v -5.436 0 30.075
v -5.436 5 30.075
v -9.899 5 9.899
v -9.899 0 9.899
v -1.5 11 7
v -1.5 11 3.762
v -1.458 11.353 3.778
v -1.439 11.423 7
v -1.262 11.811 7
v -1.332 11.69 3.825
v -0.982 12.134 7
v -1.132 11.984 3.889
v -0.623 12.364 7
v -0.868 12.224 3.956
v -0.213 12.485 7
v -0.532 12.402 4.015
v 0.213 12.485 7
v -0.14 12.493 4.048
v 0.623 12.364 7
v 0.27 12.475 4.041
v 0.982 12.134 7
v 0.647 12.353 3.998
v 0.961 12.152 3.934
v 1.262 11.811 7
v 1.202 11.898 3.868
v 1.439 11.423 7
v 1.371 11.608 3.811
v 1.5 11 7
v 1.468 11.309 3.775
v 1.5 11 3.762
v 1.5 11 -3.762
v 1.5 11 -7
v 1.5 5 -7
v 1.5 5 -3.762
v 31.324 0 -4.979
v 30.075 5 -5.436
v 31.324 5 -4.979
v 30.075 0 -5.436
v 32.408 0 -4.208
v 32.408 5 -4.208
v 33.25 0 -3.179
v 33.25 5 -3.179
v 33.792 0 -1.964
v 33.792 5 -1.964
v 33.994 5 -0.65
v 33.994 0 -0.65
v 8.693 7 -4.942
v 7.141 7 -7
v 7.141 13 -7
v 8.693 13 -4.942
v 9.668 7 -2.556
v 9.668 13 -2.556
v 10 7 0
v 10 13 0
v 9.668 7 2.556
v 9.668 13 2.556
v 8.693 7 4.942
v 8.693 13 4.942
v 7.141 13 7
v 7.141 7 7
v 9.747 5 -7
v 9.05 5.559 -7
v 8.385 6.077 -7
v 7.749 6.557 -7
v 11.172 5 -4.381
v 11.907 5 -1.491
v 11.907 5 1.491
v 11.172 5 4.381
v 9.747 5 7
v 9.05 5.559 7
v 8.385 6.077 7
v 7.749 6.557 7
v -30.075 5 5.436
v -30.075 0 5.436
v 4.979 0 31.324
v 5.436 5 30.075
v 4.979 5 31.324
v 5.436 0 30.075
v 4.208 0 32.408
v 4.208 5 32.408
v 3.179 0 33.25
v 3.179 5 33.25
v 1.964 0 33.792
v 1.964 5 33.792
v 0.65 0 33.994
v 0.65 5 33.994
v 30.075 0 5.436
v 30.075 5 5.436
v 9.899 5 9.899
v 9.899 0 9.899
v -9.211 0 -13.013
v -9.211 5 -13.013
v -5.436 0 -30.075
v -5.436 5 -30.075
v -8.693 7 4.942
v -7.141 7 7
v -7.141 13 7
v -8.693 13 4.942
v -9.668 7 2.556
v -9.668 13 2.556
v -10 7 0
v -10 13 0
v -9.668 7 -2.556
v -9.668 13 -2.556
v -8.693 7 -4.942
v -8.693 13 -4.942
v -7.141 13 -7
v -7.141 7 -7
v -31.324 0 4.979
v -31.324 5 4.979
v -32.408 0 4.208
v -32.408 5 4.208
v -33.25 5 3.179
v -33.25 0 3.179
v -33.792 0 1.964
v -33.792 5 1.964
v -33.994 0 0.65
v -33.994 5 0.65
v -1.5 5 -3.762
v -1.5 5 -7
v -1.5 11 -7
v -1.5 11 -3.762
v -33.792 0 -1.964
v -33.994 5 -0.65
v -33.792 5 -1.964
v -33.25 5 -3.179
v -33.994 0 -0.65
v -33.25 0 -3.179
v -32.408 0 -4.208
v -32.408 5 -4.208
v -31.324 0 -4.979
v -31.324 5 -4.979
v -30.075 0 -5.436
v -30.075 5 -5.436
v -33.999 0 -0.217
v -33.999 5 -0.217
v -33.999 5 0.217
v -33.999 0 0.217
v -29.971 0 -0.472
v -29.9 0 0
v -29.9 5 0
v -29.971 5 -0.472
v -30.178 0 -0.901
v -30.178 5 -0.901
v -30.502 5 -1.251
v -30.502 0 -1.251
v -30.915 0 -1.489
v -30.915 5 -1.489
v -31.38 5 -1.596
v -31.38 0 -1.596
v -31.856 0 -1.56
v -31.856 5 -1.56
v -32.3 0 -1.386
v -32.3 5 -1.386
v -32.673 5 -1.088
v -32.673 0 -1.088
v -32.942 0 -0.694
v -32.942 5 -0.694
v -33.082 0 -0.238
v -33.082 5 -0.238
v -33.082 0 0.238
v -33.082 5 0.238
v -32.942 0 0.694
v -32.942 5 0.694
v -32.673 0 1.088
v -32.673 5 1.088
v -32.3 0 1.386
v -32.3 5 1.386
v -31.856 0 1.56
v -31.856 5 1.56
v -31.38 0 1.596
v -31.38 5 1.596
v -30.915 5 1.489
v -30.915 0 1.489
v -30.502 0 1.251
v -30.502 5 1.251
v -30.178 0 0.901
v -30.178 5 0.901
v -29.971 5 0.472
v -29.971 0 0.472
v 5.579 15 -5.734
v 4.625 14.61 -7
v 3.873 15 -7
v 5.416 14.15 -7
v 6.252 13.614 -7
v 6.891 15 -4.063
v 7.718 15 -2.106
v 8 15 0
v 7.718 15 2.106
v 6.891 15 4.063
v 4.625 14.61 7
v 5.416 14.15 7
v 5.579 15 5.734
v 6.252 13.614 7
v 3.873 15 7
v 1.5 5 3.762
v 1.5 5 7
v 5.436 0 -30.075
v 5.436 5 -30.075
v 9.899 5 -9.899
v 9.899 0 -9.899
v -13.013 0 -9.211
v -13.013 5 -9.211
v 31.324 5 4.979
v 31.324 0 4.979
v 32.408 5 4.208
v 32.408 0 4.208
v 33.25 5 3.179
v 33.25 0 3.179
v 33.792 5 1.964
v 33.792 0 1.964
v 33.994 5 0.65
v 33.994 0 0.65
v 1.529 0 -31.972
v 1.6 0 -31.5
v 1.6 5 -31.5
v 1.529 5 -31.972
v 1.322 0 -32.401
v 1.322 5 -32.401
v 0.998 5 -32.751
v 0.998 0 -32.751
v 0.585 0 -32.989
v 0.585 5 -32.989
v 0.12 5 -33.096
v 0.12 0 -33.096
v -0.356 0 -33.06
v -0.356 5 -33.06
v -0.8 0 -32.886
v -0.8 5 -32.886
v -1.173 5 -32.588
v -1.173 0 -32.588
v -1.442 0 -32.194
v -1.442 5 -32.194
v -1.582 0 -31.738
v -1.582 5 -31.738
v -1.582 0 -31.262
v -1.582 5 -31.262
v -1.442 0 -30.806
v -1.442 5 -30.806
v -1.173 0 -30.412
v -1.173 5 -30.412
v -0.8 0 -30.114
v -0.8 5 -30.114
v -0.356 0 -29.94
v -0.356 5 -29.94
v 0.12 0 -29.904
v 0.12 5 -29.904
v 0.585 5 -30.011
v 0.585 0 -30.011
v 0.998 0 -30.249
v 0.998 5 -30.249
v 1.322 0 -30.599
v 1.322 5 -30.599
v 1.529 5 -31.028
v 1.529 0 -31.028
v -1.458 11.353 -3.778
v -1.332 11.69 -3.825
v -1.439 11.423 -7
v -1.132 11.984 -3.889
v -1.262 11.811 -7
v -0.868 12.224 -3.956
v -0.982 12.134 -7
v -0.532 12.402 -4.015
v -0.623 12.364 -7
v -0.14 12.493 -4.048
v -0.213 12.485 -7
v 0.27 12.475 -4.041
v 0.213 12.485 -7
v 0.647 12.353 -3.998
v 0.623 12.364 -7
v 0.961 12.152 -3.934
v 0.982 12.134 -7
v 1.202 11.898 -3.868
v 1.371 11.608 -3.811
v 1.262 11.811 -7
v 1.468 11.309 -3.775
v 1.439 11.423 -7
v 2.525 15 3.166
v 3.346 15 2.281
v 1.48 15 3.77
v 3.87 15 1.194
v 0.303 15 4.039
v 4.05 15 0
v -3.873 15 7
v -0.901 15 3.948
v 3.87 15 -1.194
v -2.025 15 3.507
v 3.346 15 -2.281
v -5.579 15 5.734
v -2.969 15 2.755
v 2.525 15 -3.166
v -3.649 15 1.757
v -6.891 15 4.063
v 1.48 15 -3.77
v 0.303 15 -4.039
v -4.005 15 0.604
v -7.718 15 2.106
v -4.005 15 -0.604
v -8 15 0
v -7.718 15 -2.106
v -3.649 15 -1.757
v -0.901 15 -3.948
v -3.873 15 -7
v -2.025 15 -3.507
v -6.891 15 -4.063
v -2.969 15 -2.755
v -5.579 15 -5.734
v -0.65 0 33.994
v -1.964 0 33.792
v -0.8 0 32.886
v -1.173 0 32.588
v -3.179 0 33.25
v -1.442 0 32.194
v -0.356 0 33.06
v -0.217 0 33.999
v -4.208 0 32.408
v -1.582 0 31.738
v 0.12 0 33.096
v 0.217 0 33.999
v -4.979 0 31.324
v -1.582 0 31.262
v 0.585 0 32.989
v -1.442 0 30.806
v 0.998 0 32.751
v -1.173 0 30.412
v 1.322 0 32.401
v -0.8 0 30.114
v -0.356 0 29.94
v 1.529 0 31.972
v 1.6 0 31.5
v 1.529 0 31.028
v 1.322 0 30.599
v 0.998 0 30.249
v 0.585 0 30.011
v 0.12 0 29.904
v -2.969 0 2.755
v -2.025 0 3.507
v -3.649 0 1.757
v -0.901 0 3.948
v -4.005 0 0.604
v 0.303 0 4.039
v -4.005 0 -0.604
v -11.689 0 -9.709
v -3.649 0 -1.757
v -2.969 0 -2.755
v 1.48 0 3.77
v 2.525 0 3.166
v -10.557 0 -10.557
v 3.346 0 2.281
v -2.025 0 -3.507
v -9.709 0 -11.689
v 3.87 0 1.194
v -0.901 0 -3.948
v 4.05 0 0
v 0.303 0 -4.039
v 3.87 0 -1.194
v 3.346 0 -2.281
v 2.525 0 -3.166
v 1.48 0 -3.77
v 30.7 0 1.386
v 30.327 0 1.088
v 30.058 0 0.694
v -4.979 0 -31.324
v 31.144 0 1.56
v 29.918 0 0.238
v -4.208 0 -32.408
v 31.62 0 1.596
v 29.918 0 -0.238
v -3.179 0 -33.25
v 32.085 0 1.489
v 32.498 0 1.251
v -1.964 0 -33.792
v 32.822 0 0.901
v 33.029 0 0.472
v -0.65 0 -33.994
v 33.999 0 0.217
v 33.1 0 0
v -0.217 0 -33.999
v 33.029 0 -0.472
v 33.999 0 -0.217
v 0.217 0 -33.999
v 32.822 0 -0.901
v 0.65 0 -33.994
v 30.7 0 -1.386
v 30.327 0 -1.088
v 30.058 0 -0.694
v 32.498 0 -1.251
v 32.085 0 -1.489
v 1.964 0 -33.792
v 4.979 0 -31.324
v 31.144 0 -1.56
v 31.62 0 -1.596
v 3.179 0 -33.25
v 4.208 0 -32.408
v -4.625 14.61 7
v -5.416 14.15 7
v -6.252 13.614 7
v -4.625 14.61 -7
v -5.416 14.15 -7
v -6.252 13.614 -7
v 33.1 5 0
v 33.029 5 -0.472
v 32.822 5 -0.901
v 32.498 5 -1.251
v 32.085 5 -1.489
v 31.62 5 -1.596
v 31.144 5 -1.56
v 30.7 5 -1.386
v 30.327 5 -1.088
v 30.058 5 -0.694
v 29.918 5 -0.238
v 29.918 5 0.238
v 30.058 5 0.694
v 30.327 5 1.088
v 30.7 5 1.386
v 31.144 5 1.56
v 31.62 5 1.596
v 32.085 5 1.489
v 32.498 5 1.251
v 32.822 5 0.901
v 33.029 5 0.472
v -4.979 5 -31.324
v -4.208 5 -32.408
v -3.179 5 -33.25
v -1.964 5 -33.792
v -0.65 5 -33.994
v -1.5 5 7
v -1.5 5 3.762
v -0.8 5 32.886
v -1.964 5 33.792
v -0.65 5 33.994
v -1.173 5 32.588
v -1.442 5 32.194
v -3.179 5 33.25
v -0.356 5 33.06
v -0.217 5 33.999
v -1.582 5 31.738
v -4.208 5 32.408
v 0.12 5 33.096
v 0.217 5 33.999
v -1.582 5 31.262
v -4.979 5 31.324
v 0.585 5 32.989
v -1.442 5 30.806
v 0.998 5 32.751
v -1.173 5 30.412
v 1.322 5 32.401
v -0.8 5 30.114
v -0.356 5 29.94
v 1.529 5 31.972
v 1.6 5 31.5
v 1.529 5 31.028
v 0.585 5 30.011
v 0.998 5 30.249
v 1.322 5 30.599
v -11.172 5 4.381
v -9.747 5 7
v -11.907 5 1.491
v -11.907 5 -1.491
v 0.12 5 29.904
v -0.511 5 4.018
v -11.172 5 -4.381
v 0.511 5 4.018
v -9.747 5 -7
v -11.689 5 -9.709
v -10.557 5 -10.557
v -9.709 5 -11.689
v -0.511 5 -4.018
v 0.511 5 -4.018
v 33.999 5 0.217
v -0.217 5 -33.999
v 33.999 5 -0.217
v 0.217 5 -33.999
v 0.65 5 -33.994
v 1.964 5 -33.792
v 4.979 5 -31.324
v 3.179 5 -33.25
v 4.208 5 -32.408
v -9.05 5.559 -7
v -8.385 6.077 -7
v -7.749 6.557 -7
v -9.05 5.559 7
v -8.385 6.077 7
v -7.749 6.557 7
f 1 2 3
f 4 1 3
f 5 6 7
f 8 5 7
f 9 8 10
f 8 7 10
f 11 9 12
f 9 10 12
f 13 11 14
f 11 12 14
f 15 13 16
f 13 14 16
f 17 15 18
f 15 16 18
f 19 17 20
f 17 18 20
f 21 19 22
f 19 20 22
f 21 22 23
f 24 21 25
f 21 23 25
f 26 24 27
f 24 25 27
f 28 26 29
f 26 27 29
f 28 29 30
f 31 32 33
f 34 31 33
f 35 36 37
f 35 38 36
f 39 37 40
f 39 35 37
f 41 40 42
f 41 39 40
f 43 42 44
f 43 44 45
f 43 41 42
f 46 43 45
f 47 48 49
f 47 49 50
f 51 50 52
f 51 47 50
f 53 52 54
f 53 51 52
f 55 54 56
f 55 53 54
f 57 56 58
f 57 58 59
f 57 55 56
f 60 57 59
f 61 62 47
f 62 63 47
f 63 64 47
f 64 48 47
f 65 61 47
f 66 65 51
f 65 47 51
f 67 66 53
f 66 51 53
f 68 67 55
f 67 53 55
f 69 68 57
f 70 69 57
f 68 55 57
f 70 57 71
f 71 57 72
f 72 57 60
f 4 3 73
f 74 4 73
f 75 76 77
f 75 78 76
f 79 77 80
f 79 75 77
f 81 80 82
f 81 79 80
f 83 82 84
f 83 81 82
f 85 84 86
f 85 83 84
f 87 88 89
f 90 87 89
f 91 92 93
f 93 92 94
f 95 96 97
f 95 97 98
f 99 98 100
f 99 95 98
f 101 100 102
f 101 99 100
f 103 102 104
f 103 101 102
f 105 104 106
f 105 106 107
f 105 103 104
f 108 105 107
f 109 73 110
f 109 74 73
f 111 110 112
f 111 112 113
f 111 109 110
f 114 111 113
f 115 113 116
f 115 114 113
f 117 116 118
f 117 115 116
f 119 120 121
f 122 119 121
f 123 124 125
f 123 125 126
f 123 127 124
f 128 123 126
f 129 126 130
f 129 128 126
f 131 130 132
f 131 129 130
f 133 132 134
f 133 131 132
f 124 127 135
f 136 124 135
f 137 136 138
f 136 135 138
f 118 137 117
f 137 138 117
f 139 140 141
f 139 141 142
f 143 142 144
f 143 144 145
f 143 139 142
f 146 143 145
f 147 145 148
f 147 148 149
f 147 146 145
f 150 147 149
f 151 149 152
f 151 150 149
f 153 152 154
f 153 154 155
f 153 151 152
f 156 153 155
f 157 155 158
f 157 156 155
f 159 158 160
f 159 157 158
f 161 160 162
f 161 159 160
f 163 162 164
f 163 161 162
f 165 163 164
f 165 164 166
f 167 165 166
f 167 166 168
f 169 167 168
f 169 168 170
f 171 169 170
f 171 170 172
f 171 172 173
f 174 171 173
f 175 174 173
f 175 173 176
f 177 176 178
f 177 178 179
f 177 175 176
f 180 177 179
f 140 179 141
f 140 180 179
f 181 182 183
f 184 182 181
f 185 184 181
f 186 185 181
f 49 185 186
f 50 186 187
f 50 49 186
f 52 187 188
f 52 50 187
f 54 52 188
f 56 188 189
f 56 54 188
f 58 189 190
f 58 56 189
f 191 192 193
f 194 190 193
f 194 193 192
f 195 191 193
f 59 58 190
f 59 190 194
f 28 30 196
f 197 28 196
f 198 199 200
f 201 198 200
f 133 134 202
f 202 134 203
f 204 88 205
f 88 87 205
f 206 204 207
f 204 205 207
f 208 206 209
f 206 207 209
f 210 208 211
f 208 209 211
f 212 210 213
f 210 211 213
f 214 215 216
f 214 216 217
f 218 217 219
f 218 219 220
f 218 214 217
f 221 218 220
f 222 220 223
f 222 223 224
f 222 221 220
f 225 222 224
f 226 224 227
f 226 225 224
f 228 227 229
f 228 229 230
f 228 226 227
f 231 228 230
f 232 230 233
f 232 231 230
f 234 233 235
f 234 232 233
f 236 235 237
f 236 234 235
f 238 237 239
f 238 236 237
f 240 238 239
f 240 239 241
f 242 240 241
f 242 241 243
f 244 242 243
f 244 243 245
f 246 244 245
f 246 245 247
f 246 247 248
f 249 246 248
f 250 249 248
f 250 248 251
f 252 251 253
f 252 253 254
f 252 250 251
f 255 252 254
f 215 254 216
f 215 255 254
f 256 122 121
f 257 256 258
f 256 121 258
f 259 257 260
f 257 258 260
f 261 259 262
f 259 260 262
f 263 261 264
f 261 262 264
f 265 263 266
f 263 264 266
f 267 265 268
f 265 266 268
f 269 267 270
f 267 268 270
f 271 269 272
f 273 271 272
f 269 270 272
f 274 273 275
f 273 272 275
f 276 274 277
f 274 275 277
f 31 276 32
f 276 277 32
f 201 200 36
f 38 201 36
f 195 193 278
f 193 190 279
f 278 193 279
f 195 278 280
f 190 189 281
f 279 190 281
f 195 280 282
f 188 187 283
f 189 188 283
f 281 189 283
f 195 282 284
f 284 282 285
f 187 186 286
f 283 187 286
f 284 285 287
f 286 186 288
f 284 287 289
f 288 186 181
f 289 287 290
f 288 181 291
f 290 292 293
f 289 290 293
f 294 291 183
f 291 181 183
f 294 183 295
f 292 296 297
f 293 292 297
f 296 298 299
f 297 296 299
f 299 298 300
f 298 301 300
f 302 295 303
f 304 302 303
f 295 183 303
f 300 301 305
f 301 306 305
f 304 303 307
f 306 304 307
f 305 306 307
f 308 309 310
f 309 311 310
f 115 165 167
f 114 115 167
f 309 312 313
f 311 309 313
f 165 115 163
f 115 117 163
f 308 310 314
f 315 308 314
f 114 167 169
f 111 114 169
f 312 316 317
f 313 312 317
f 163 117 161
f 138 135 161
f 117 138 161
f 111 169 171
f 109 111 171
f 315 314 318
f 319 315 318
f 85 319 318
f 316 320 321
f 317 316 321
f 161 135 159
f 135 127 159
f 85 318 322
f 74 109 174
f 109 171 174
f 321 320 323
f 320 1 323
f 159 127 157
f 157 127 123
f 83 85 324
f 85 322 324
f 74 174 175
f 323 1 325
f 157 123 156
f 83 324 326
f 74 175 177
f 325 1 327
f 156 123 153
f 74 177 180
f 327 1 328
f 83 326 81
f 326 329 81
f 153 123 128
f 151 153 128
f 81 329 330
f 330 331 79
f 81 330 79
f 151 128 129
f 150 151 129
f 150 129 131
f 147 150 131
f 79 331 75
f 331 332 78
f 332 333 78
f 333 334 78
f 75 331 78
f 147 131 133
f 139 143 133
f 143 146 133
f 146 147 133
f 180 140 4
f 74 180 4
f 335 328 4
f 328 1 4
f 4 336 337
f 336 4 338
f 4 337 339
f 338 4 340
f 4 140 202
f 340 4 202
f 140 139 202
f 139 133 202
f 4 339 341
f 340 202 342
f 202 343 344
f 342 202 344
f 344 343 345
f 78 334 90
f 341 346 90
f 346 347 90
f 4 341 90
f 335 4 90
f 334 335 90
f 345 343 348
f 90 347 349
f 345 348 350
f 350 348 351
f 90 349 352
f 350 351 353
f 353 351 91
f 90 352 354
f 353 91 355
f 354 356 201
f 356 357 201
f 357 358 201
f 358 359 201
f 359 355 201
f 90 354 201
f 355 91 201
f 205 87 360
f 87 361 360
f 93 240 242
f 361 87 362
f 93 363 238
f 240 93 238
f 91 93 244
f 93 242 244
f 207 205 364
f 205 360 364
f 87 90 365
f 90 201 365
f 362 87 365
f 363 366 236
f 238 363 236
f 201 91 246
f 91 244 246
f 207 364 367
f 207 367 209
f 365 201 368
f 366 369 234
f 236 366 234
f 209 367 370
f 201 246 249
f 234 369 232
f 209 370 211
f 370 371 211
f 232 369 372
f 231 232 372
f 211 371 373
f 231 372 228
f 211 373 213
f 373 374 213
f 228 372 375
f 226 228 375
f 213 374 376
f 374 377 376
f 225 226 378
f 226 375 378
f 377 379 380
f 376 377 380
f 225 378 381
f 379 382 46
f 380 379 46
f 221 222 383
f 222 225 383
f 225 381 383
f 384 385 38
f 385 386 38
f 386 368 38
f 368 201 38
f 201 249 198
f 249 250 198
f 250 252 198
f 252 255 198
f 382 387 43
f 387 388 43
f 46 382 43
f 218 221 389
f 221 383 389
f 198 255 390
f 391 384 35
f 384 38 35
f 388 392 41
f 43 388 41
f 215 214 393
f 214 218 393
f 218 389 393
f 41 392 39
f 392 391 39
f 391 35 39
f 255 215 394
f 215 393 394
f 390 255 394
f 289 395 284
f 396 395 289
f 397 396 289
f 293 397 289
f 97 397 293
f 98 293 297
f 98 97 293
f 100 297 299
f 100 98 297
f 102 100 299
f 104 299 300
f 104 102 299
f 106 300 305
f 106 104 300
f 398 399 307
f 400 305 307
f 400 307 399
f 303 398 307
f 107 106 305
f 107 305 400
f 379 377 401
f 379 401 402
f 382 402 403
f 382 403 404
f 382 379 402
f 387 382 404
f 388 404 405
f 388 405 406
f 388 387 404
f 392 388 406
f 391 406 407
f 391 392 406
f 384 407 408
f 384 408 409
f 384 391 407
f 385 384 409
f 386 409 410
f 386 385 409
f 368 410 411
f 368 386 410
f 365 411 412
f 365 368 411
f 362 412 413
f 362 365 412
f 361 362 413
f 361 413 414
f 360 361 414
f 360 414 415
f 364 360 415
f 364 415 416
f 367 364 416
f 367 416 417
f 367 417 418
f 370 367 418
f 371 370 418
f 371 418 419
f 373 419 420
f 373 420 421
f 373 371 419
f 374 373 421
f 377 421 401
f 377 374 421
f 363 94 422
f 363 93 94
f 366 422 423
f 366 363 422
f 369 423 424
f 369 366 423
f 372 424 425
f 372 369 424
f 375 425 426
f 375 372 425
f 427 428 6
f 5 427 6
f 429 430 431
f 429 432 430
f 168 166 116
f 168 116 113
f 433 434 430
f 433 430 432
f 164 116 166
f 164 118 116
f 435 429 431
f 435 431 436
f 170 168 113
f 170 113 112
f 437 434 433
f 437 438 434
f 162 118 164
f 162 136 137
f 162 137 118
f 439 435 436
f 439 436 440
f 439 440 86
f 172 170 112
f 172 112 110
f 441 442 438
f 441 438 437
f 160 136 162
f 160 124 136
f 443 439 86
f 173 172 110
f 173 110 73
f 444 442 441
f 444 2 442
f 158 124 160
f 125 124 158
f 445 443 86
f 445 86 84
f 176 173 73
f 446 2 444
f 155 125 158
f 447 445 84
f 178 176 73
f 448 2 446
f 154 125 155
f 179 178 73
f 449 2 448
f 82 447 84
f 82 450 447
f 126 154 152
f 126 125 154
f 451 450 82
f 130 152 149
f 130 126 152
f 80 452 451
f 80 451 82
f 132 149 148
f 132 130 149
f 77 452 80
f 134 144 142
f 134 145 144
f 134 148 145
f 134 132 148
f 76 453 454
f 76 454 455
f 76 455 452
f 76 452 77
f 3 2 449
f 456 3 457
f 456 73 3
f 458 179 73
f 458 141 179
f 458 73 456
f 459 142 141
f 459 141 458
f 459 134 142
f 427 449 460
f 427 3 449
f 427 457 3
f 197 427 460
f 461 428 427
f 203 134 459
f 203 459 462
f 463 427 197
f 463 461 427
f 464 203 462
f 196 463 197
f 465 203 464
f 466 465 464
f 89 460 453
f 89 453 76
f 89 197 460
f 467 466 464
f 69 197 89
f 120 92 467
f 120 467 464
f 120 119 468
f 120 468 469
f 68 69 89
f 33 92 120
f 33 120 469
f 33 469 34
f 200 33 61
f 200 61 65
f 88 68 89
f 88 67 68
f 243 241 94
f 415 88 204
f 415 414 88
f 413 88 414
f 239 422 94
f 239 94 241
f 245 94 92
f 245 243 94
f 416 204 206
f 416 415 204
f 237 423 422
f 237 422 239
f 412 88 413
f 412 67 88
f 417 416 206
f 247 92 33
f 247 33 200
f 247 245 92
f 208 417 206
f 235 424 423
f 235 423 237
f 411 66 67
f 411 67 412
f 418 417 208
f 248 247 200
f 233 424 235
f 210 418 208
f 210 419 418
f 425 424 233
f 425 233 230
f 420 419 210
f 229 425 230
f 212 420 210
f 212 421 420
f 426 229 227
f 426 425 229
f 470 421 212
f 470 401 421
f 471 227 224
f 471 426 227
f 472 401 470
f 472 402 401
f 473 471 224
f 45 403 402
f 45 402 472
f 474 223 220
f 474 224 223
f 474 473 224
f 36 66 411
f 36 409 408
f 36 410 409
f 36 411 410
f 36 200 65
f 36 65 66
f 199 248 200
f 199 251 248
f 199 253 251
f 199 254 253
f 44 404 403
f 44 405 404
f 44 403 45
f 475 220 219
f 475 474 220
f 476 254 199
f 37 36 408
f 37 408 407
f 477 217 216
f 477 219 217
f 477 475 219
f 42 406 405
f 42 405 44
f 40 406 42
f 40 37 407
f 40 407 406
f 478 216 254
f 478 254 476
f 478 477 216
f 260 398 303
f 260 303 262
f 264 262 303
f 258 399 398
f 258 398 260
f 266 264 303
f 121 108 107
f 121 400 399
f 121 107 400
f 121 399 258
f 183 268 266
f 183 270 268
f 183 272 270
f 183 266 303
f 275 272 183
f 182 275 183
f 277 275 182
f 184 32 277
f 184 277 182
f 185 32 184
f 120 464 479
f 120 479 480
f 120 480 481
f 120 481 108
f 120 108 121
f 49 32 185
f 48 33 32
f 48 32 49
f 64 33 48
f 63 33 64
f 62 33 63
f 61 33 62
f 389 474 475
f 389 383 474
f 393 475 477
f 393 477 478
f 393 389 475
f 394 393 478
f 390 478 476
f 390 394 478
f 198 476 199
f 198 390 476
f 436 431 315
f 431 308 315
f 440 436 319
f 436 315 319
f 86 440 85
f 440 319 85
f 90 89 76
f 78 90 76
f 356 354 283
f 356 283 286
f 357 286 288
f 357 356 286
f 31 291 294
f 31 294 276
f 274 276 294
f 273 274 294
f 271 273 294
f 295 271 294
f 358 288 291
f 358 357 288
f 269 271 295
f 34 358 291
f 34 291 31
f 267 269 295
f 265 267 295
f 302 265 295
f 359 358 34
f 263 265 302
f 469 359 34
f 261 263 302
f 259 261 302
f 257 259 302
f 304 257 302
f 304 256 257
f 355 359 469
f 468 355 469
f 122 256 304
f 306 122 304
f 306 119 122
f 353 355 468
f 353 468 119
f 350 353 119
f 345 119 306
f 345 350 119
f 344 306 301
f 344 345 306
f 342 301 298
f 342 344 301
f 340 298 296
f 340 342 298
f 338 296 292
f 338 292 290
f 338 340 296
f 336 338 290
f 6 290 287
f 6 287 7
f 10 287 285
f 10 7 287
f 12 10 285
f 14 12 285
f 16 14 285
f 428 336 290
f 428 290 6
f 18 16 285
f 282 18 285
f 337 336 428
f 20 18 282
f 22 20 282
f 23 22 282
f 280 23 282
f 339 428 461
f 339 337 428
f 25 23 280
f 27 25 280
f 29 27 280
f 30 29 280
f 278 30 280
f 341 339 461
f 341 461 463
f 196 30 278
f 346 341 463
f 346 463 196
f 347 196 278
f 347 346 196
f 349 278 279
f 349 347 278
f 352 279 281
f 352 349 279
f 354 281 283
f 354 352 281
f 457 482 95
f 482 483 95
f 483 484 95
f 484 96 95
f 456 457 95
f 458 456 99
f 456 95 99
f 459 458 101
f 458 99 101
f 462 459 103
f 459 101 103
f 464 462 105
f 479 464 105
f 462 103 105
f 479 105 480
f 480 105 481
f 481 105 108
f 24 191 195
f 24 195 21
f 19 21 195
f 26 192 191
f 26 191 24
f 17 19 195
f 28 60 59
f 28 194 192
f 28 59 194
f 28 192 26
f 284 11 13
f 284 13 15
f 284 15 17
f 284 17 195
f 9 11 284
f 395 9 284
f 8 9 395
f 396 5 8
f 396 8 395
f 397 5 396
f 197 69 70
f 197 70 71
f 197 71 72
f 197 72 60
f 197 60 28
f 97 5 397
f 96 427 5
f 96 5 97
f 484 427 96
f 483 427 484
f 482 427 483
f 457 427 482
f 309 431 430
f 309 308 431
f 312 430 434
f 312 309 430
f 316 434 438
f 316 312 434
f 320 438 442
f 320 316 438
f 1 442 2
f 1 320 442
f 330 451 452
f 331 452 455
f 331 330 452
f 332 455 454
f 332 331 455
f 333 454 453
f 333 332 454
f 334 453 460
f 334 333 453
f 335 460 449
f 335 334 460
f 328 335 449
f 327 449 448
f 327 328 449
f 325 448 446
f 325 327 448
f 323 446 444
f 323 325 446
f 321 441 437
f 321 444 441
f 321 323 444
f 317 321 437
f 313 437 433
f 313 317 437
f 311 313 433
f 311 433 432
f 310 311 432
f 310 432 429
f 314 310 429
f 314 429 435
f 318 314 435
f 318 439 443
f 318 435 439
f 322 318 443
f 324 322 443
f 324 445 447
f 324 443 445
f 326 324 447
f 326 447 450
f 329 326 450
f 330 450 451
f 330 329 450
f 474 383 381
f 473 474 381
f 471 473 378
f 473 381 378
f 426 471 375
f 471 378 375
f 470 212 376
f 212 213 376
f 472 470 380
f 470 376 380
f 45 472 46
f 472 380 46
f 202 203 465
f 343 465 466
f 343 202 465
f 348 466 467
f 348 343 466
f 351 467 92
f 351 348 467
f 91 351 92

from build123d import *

# Parameters (mm, degrees)
SKETCH1_R           = 34
SKETCH1_R_2         = 1.6
SKETCH1_R_3         = 4.05
BOSS_EXTRUDE1_DEPTH = 5
SKETCH2_R           = 4.05
BOSS_EXTRUDE2_DEPTH = 10
CUT_EXTRUDE1_DEPTH  = 42
CUT_EXTRUDE2_DEPTH  = 10
FILLET1_R           = 5
CHAMFER2_SIZE       = 2


with BuildPart() as part:
    # Sketch1 → Boss-Extrude1 (new body)
    with BuildSketch(Plane(origin=(0, 0, 0), x_dir=(1, 0, 0), z_dir=(0, 1, 0))):
        Circle(SKETCH1_R)
        with Locations((0, 31.5)):
            Circle(SKETCH1_R_2, mode=Mode.SUBTRACT)
        with Locations((31.5, 0)):
            Circle(SKETCH1_R_2, mode=Mode.SUBTRACT)
        with Locations((0, -31.5)):
            Circle(SKETCH1_R_2, mode=Mode.SUBTRACT)
        with Locations((-31.5, 0)):
            Circle(SKETCH1_R_2, mode=Mode.SUBTRACT)
        Circle(SKETCH1_R_3, mode=Mode.SUBTRACT)
    extrude(amount=BOSS_EXTRUDE1_DEPTH)

    # Sketch2 → Boss-Extrude2 (add)
    with BuildSketch(Plane(origin=(0, 5, 0), x_dir=(1, 0, 0), z_dir=(0, 1, 0))):
        with BuildLine():
            Line((-7.141428429, 7), (7.141428429, 7))
            ThreePointArc((7.141428429, 7), (10, 0), (7.141428429, -7))
            Line((7.141428429, -7), (-7.141428429, -7))
            ThreePointArc((-7.141428429, -7), (-10, 0), (-7.141428429, 7))
        make_face()
        Circle(SKETCH2_R, mode=Mode.SUBTRACT)
    extrude(amount=BOSS_EXTRUDE2_DEPTH)

    # Sketch3 → Cut-Extrude1 (cut, through all)
    with BuildSketch(Plane(origin=(0, 0, -7), x_dir=(-1, 0, 0), z_dir=(0, 0, -1))):
        with BuildLine():
            Line((1.5, 5), (1.5, 11))
            ThreePointArc((1.5, 11), (0, 12.5), (-1.5, 11))
            Line((-1.5, 11), (-1.5, 5))
            Line((-1.5, 5), (1.5, 5))
        make_face()
    extrude(amount=-CUT_EXTRUDE1_DEPTH, mode=Mode.SUBTRACT)

    # Sketch4 → Cut-Extrude2 (cut)
    with BuildSketch(Plane(origin=(0, 5, 0), x_dir=(1, 0, 0), z_dir=(0, 1, 0))):
        with BuildLine():
            Line((-33.682156271, 4.638140673), (-9.899494937, 9.899494937))
            Line((-9.899494937, 9.899494937), (-4.638140673, 33.682156271))
            ThreePointArc((-4.638140673, 33.682156271), (-24.04163056, 24.04163056), (-33.682156271, 4.638140673))
        make_face()
        with BuildLine():
            Line((4.638140673, 33.682156271), (9.899494937, 9.899494937))
            Line((9.899494937, 9.899494937), (33.682156271, 4.638140673))
            ThreePointArc((33.682156271, 4.638140673), (24.04163056, 24.04163056), (4.638140673, 33.682156271))
        make_face()
        with BuildLine():
            Line((33.682156271, -4.638140673), (9.899494937, -9.899494937))
            Line((9.899494937, -9.899494937), (4.638140673, -33.682156271))
            ThreePointArc((4.638140673, -33.682156271), (24.04163056, -24.04163056), (33.682156271, -4.638140673))
        make_face()
        with BuildLine():
            Line((-4.638140673, -33.682156271), (-9.899494937, -9.899494937))
            Line((-9.899494937, -9.899494937), (-33.682156271, -4.638140673))
            ThreePointArc((-33.682156271, -4.638140673), (-24.04163056, -24.04163056), (-4.638140673, -33.682156271))
        make_face()
    extrude(amount=-CUT_EXTRUDE2_DEPTH, mode=Mode.SUBTRACT)

    # Fillet1
    fillet1_edges = [part.edges().sort_by_distance(p)[0] for p in [
        (-9.899494937, 2.5, -9.899494937),
        (-33.682156271, 2.5, -4.638140673),
        (-4.638140673, 2.5, -33.682156271),
        (4.638140673, 2.5, -33.682156271),
        (33.682156271, 2.5, -4.638140673),
        (33.682156271, 2.5, 4.638140673),
        (4.638140673, 2.5, 33.682156271),
        (-4.638140673, 2.5, 33.682156271),
        (-33.682156271, 2.5, 4.638140673),
    ]]
    fillet(fillet1_edges, radius=FILLET1_R)

    # Chamfer2
    chamfer2_edges = [part.edges().sort_by_distance(p)[0] for p in [
        (-10, 15, 0),
        (10, 15, 0),
        (-10, 5, 0),
        (10, 5, 0),
    ]]
    chamfer(chamfer2_edges, length=CHAMFER2_SIZE)


solid = part.part
